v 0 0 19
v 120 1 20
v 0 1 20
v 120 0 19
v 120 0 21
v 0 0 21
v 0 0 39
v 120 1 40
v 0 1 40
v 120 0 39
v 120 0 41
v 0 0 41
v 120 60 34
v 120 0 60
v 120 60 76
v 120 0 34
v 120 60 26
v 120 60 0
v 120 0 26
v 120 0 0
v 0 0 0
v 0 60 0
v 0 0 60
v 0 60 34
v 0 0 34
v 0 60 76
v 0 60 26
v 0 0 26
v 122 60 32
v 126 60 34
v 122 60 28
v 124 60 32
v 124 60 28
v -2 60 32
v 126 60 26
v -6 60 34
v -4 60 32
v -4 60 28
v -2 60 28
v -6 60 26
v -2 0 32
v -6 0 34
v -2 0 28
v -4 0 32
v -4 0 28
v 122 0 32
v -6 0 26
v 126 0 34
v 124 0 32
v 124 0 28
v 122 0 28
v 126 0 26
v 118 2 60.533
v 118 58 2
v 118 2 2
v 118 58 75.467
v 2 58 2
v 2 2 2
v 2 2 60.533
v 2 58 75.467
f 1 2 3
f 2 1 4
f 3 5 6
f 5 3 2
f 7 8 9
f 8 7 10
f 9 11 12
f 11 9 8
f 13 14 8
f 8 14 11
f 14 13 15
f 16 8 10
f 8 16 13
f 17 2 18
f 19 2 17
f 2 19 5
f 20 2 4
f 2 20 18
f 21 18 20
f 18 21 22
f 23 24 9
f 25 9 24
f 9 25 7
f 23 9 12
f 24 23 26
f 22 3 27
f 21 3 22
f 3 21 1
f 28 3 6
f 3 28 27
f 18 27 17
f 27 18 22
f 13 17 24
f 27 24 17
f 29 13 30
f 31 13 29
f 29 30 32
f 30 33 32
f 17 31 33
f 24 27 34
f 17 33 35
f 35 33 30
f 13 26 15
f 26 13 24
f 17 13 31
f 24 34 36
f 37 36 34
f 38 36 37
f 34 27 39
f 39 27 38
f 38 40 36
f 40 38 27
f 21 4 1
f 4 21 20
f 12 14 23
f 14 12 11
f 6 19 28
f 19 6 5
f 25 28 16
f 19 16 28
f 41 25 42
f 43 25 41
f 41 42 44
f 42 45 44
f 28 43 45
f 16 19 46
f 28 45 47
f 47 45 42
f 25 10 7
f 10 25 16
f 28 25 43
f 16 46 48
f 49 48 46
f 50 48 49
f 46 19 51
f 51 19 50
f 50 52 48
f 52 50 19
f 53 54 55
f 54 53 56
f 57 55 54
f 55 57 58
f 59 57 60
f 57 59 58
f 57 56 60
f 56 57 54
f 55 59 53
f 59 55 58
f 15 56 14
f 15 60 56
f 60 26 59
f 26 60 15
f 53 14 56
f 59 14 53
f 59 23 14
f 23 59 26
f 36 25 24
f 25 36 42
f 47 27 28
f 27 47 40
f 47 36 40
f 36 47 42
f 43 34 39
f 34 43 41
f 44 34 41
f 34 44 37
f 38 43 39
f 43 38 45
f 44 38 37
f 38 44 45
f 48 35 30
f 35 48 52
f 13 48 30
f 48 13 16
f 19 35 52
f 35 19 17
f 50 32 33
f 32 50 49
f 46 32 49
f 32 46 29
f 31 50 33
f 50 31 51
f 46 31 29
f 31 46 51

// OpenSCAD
// file: ../../lib/logic.scad
use <./strings.scad>

function int(s, total=0, i=0) = (i == len(s))
  ? total
  : int(s, total*10 + ord(s[i]) - ord("0"), i+1);

function frac(s) = int(s) / pow(10, len(s));

function num(s) =
  let (parts = split(s, "."))
  len(parts) == 1
  ? int(parts[0])
  : int(parts[0]) + frac(parts[1]);

function any(list, i=0) = (i == len(list))
  ? false
  : list[i] || any(list, i+1);

function all(list, i=0) = (i == len(list))
  ? true
  : list[i] && all(list, i+1);

function is_int_string(s) = all([for(c=s) "0" <= c && c <= "9"]);

function is_num_string(s) =
  let (parts = split(s, "."))
  len(parts) == 1
  ? is_int_string(parts[0])
  : len(parts) == 2
    ? is_int_string(parts[0]) && is_int_string(parts[1])
    : false;

function _test_logic() =
  assert (int("123") == 123)
  assert (int("9999") == 9999)
  assert (frac("5") == 0.5)
  assert (frac("33333") == 0.33333)
  assert (frac("111111") == 0.111111)
  assert (frac("02") == 0.02)
  assert (frac("020000") == 0.02)
  assert (frac("0") == 0)
  assert (frac("0000000000000") == 0)
  assert (frac("0000000000001") == 0.0000000000001)
  assert (num("123") == 123)
  assert (num("2.75") == 2.75)
  assert (num("1234.991230149") == 1234.991230149) // I'm kinda shocked that works
  assert (any([false, "", 0, []]) == false)
  assert (any([false, "", 0, [], 1]) == true)
  assert (any([]) == false)
  assert (all([1, true, "a"]) == true)
  assert (all([1, true, "a", ""]) == false)
  assert (all([]) == true)
  assert (is_int_string("1234") == true)
  assert (is_int_string("093999914") == true)
  assert (is_int_string("123A") == false)
  assert (is_int_string("two") == false)
  assert (is_int_string("2.6") == false)
  assert (is_num_string("2.6") == true)
  assert (is_num_string("1241422.5522106") == true)
  assert (is_num_string("124142205522106") == true)
  assert (is_num_string("1241422,5522106") == false)
  assert (is_num_string("1241422.552.106") == false)
  assert (is_num_string("1241422Q") == false)
  "test logic success";

echo(_test_logic());
// file: ../../lib/strings.scad
function contains(list, item, i=0) = (i == len(list))
  ? false
  : list[i] == item || contains(list, item, i+1);

function strcat(char_array, i=0, r="") = (i == len(char_array))
  ? r
  : strcat(char_array, i+1, str(r, char_array[i]));

function substr(s, start=0, limit=undef) =
  // return str[i] where start <= i < limit
  let (end = limit == undef ? len(s)-1 : min(limit-1, len(s)-1))
  end < start
  ? ""
  : strcat([for (i=[start:end]) s[i]]);

function contains_substr(s, sub) =
  // return true if substr is found anywhere in s
  let (list = [for (i=[0:1:len(s)-len(sub)]) substr(s, start=i, limit=i+len(sub))])
  contains(list, sub);

function replace_substr(s, repl, start=0, limit=undef) =
  // remove a substring and replace it with another string
  let (end = limit == undef ? len(s)-1 : limit-1)
  str(substr(s, limit=start), repl, substr(s, start=end+1));

function split(s, separator=" ", parts=[]) =
  let (match=search(separator, s, 0)[0])
  match == []
  ? concat(parts, [s])
  : split(substr(s, start=match[0]+1), separator, concat(parts, [substr(s, limit=match[0])]));

function first(string, char, after=-1) =
  let (result = search(char, substr(string, start=after+1), 1))
  result == []
  ? undef
  : result[0] + after+1;

function last(string, char) =
  let (result=search(char, string, 0))
  result == []
  ? undef
  : result[0][len(result[0])-1];

function _test_strings() =
  assert (contains("abcd", "d") == true)
  assert (contains("abcd", "Q") == false)
  assert (contains([1, 2, 3, 4], 1) == true)
  assert (contains([1, 2, 3, 4], 5) == false)
  assert (contains([["a"], 2, [], ""], []) == true)
  assert (contains([["a"], 2, [], ""], ["a"]) == true)
  assert (contains([["a"], 2, [], ""], ["b"]) == false)
  assert (strcat([]) == "")
  assert (strcat(["a"]) == "a")
  assert (strcat(["a", "b"]) == "ab")
  assert (strcat(["a", "", "b"]) == "ab")
  assert (substr("abcde") == "abcde")
  assert (substr("abcde", start=0) == "abcde")
  assert (substr("abcde", start=1) == "bcde")
  assert (substr("abcde", limit=3) == "abc")
  assert (substr("abcde", start=2, limit=4) == "cd")
  assert (substr("abcde", start=99) == "")
  assert (contains_substr("abcde", "a") == true)
  assert (contains_substr("abcde", "ab") == true)
  assert (contains_substr("abcde", "abcde") == true)
  assert (contains_substr("abcde", "de") == true)
  assert (contains_substr("abcde", "Q") == false)
  assert (contains_substr("abcde", "abcdefghijklmnop") == false)
  assert (contains_substr("abcde", "e*") == false)
  assert (contains_substr("abcde", "") == true)
  assert (replace_substr("abcde", "CD", start=2, limit=4) == "abCDe")
  assert (replace_substr("abcde", "CD", start=2, limit=5) == "abCD")
  assert (replace_substr("abcde", "CD", start=2, limit=999) == "abCD")
  assert (replace_substr("abcde", "CD", start=2) == "abCD")
  assert (replace_substr("abcde", "AAA", start=0) == "AAA")
  assert (replace_substr("abcde", "AAA") == "AAA")
  assert (replace_substr("abcde", "III", limit=0) == "IIIabcde")
  assert (replace_substr("abcde", "III", start=3, limit=3) == "abcIIIde")
  assert (replace_substr("abcde", "III", start=5) == "abcdeIII")
  assert (replace_substr("abcde", "III", start=999) == "abcdeIII")
  assert (split("abc,defg,hi", ",") == ["abc", "defg", "hi"])
  assert (split("abc,defg,hi", "#") == ["abc,defg,hi"])
  assert (split(",,ab,c,,d,efg", ",") == ["", "", "ab", "c", "", "d", "efg"])
  assert (split("a b  cd ") == ["a", "b", "", "cd", ""])
  assert (split("abcd") == ["abcd"])
  assert (first("aaaaa", "a") == 0)
  assert (first("00aaa", "a") == 2)
  assert (first("0000a", "a") == 4)
  assert (first("0000a", "Z") == undef)
  assert (first("aaaaa", "a", after=2) == 3)
  assert (first("aaa00", "a", after=2) == undef)
  assert (first("a000a", "a", after=0) == 4)
  assert (first("a000a", "a", after=99) == undef)
  assert (last("aaaaa", "a") == 4)
  assert (last("aaa00", "a") == 2)
  assert (last("a0000", "a") == 0)
  assert (last("a0000", "Z") == undef)
  "test strings success";

echo(_test_strings());
// file: ../../lib/props.scad
use <./logic.scad>
use <./strings.scad>

// Global prop function.
// The idea here is to define a function like:
//   function prop(key) = getprop(key, global_props);
// and then use that to share variables throughout your multi-file design.
// A bunch of expressions are available within the props dictionary, like
// references to other props, and various computations. Whitespace
// is strict in the expressions.
props_example = [
  ["key1", 1],
  ["key2", 2],
  ["key3", 3],
  ["key4", "$key3 * 20"],
  ["namespace.value1", 8],
  ["namespace.value2", "$key2"],
  ["othernamespace.value1", "$namespace.value2"],
  ["s", "hello"],
  ["e1", "$key3 / 2"],
  ["e2", "$namespace.value2 + 1.275"],
  ["e3", "$othernamespace.value1 * 6"],
  ["e4", "$key2 ^ 6"],
  ["e5", "$key3 % 2"],
  ["e6", "cos $key4"],
  ["p1", "$key3 * ($key2 + $key1)"],
  ["p2", "(1 + 2) * (2 ^ 3)"],
  ["p3", "((1 + $e5) + 1) + (cos $key4)"],
  ["zero", 0],
  ["false", false],
  ["undef", undef],
  ["empty-array", []],
];

function eval_literal(args) =
  // compute things like `2 + 4` or `cos 45`
  len(args) == 0 ? undef :
  args[0] == "norm" ? norm([for(i=[1:len(args)-1]) args[i]]) :
  len(args) == 3
  ? args[1] == "/" ? args[0] / args[2]
    : args[1] == "*" ? args[0] * args[2]
    : args[1] == "+" ? args[0] + args[2]
    : args[1] == "-" ? args[0] - args[2]
    : args[1] == "^" ? args[0] ^ args[2]
    : args[1] == "%" ? args[0] % args[2]
    : undef
  : len(args) == 2
    ? args[0] == "sin" ? sin(args[1])
      : args[0] == "cos" ? cos(args[1])
      : args[0] == "tan" ? tan(args[1])
      : args[0] == "asin" ? asin(args[1])
      : args[0] == "acos" ? acos(args[1])
      : args[0] == "atan" ? atan(args[1])
      : args[0] == "sqrt" ? sqrt(args[1])
      : undef
    : len(args) == 1
      ? args[0]
      : undef;

function eval_raw(expression, props) =
  // resolve types and props in expressions, like "(cos $thing) * ($other / 3)"
  // note that whitespace is not ignored
  !is_string(expression)
  ? expression
  : !contains(expression, "(")
    ? // simple expression like "$thing + 5"
      eval_literal([
        for (arg=split(expression))
          arg[0] == "$"
          ? getprop(substr(arg, start=1), props)
          : is_num_string(arg)
            ? num(arg)
            : arg
      ])
    : // resolve the innermost parens and start again
      let (inner_start = last(expression, "("),
           inner_end = first(expression, ")", after=inner_start),
           inner = eval_raw(substr(expression, inner_start+1, inner_end), props))
      eval_raw(replace_substr(expression, inner, inner_start, inner_end+1), props);

function getprop(key, props) =
  let (prop = props[search([key], props)[0]][1])
  assert (prop != undef, str("Missing key in properties: ", key))
  let (result = eval_raw(prop, props))
  assert (result != undef, str("Invalid expression in properties: ", prop))
  result;

function _test_props() =
  assert (getprop("key3", props_example) == 3)
  assert (getprop("namespace.value2", props_example) == 2)
  assert (getprop("e1", props_example) == 1.5)
  assert (getprop("e2", props_example) == 3.275)
  assert (getprop("e3", props_example) == 12)
  assert (getprop("e4", props_example) == 64)
  assert (getprop("e5", props_example) == 1)
  assert (getprop("e6", props_example) == 0.5)
  assert (getprop("p1", props_example) == 9)
  assert (getprop("p2", props_example) == 24)
  assert (getprop("p3", props_example) == 3.5)
  assert (getprop("s", props_example) == "hello")
  assert (getprop("zero", props_example) == 0)
  assert (getprop("false", props_example) == false)
  assert (getprop("empty-array", props_example) == [])
  "test props success";

echo(_test_props());
// file: ../../lib/shapes.scad
use <./strings.scad>

$fa = $preview ? 1 : .1;
$fs = $preview ? 1 : .1;

// Beginnings of a 3d shapes library. I want shapes with a "margin" property
// and possibly specific overrides for margins in a particular direction.
// The idea is to add a thickness around the outside of the entire shape
// without changing the center of the shape. This can be used with
// `difference` to carve out space for shapes to fit, with adjustable
// tolerance.

// given on="x+,y+" or whatever, figure out the translation vector
function _t(on, x=0, y=0, z=0) = 
  let(t = split(on, ","))
  (contains(t, "x+") ? [ x, 0, 0] : [0, 0, 0]) +
  (contains(t, "x-") ? [-x, 0, 0] : [0, 0, 0]) +
  (contains(t, "y+") ? [0,  y, 0] : [0, 0, 0]) +
  (contains(t, "y-") ? [0, -y, 0] : [0, 0, 0]) +
  (contains(t, "z+") ? [0, 0,  z] : [0, 0, 0]) +
  (contains(t, "z-") ? [0, 0, -z] : [0, 0, 0]);

module prism(
  n=undef,
  r=undef, side=undef, // must specify one of r or side length
  z=undef, // thickness (in z direction)
  on="origin", // placement: origin | x+ | z+,y- | etc
  margin=0,       // global margin
  margin_r=undef, margin_side=undef, // override r margin
  margin_z=undef, // override z margin
  chamfer=0,
) {
  a = 180/n;
  margin_side = margin_side == undef ? margin : margin_side;
  margin_r = margin_r == undef ? margin_side/cos(a) : margin_r;
  margin_z = margin_z == undef ? margin : margin_z;
  r = r == undef ? side/(2*sin(a)) : r;
  translate(_t(on, y=r*cos(a), z=z/2))
    rotate([0, 0, 90 - (n%2 == 0 ? a : 0)])
      if (chamfer > 0) {
        // chamfer should be measured in distance perpendicular to the side, which is at
        // angle `a` from `r` (i.e. the same angle we have to rotate if n is odd.
        cz = chamfer;
        cr = chamfer/cos(a);
        // TODO chamfer should depend on the margin, but it's pretty tedious
        // for a small gain
        translate([0, 0, (z + 2*margin_z - cz)/2])
          cylinder(h=cz, r1=r + margin_r, r2=r + margin_r - cr, $fn=n, center=true);
        cylinder(h=z + 2*margin_z - 2*cz, r=r + margin_r, $fn=n, center=true);
        translate([0, 0, -(z + 2*margin_z - cz)/2])
          cylinder(h=cz, r2=r + margin_r, r1=r + margin_r - cr, $fn=n, center=true);
      } else {
        cylinder(h=z + 2*margin_z, r=r + margin_r, $fn=n, center=true);
      }
}



//difference() {
//  %prism(n=5, r=8, z=4, chamfer=1, on="y+,z-", margin=1);
//  prism(n=5, r=8, z=4, chamfer=1, on="y+,z-");
//}

module box(
  x=undef, y=undef, z=undef,  // 3 ways to specify size
  on="origin", // placement: origin | x+ | z+,y- | etc
  margin=0, // global margin
  margin_x=undef,  // override margins
  margin_y=undef,
  margin_z=undef,
  chamfer=0, // flatten the corners
) {
  s = is_num(z)  ? [x, y, z]  // size: x=num, y=num, z=num
    : is_list(x) ? x          //   or: x=[num, num, num]
    : [x, x, x];              //   or: x=num
  m = [
    margin_x == undef ? margin : margin_x,
    margin_y == undef ? margin : margin_y,
    margin_z == undef ? margin : margin_z
  ];

  translate(_t(on, x=s.x/2, y=s.y/2, z=s.z/2))
    if (chamfer > 0) {
      // This looks pretty wild, but I just want to maintain a minimum margin
      // in each of the specified directions from the chamfer, so to keep the
      // chamfer angles all at 45, you need take the smallest chamfer out of
      // the big shape (box + margins) that maintains the right margin
      // distance in each direction.
      cyz = 2*(min(m.y, m.z) + chamfer);
      cxz = 2*(min(m.x, m.z) + chamfer);
      cxy = 2*(min(m.x, m.y) + chamfer);
      intersection() {
        cube(s + 2*m, center=true);
        rotate([45,0,0])
          cube([
            s.x + 2*m.x + 1,
            (s.y + 2*m.y + s.z + 2*m.z - cyz)/sqrt(2),
            (s.y + 2*m.y + s.z + 2*m.z - cyz)/sqrt(2)
          ], center=true);
        rotate([0,45,0])
          cube([
            (s.x + 2*m.x + s.z + 2*m.z - cxz)/sqrt(2),
            s.y + 2*m.y + 1,
            (s.x + 2*m.x + s.z + 2*m.z - cxz)/sqrt(2)
          ], center=true);
        rotate([0,0,45])
          cube([
            (s.x + 2*m.x + s.y + 2*m.y - cxy)/sqrt(2),
            (s.x + 2*m.x + s.y + 2*m.y - cxy)/sqrt(2),
            s.z + 2*m.z + 1
          ], center=true);
      }
    } else {
      cube(s + 2*m, center=true);
    }
}

//difference() {
//  box(10, 20, 30, chamfer=4, margin=1, margin_x=2);
//  box(10, 20, 30, chamfer=4);
//  // see through to the chamfer on different margins
//  color("red") box(100, on="z+");
//}

//box(1, chamfer=.1, on="z+,x-");
//%box(x=10, y=10, z=.1, on="z+,x-");
// file: props.scad
use <../../lib/props.scad>

global_props = [
  // basic exterior dimensions
  ["bin.depth", 60],
  ["bin.width", 120],
  ["bin.front.height", 60],
  ["bin.back.height", 76],
  ["panel.thickness", 2],

  // lid/hinge
  ["lid.angle", "atan (($bin.back.height - $bin.front.height) / $bin.depth)"],
  ["lid.length", "norm $bin.depth ($bin.back.height - $bin.front.height)"],
  ["lid.cutout.radius", "$hinge.radius + $panel.thickness"],
  ["hinge.radius", 4],
  ["hinge.length", "$bin.width"],

  // hinge fin position
  ["hinge.fin.start", "$panel.thickness + 0.2"],
  ["hinge.fin.end", "$hinge.length - $hinge.fin.start"],
  ["hinge.fin.count", 5],

  // hinge fin shape
  ["hinge.fin.length", "$lid.length - $panel.thickness"],
  ["hinge.fin.width", 2.31],
  ["hinge.fin.height", "$hinge.radius * 2"],
  ["hinge.fin.taper.angle", 40],
  ["hinge.fin.margin", 0.2],

  // hinge pin
  ["hinge.pin.radius", 2],
  ["hinge.pin.margin", 0.2],
  ["hinge.pin.start", "$panel.thickness / 2"],
  ["hinge.pin.end", "$hinge.length - $hinge.pin.start"],
];

function prop(key) = getprop(key, global_props);
// file: arms.scad
use <../../lib/shapes.scad>
use <props.scad>

module arms(
  w=prop("bin.width"),
  fh=prop("bin.front.height"),
  d=prop("bin.depth"),
  t=prop("panel.thickness"),
) {
  translate([0, 0, fh/2]) {
    difference() {
      box(x=3*t, y=d, z=4*t, on="x-,y+");
      box(x=3*t, y=d, z=4*t, on="x-,y+", margin=-t, margin_y=1);
    }
    translate([w, 0, 0])
      difference() {
        box(x=3*t, y=d, z=4*t, on="x+,y+");
        box(x=3*t, y=d, z=4*t, on="x+,y+", margin=-t, margin_y=1);
      }
  }
};

arms();
// file: bin.scad
use <../../lib/shapes.scad>
use <props.scad>
$fa = $preview ? 1 : .1;
$fs = $preview ? 1 : .1;

module bin(
  width=prop("bin.width"),
  depth=prop("bin.depth"),
  front_height=prop("bin.front.height"),
  back_height=prop("bin.back.height"),
  panel_thickness=prop("panel.thickness"),
  lid_angle=prop("lid.angle"),
) {
  difference() {
    // bin-sized block
    box(x=width, y=depth, z=back_height, on="x+,y+,z+");

    // carve out interior
    box(x=width, y=depth, z=999, on="x+,y+,z+", margin=-panel_thickness);

    // slice off the top
    translate([0, 0, front_height])
      rotate([lid_angle, 0, 0])
        box(999, on="z+");

    // carve out the horizontal grooves on the front
    for (h=[1/3, 2/3]) {
      translate([0, panel_thickness/2, front_height*h])
        rotate([45, 0, 0])
          box(999, on="y-,z+");
    }
  }
}

bin();
// file: lid.scad
use <props.scad>
use <../../lib/util.scad>

$fn = $preview ? 30 : 128;

// mode idea:
// use mode "normal" for the shape if it's free of any obstructions
// use mode "margin" to subtract space around the shape so that it can move
// use mode "cutout" to subtract interior space for a shape so that it can be inserted into a solid

module _fin(
  l=prop("hinge.fin.length"),
  w=prop("hinge.fin.width"),
  h=prop("hinge.fin.height"),
  a=prop("hinge.fin.taper.angle"),
  m=prop("hinge.fin.margin"),
  mode="normal", // "normal" or "margin"
  bump=undef, // "left", "right", or undef
) {
  // fin arm (no margins necessary)
  translate([0, 0, -w/2])
    linear_extrude(w)
      translate([0, -h/2, 0])
        polygon([[0,0], [0, h], [l, h], [l - (h / tan(a)), 0]]);

  // circular part (with optional margin)
  translate([0, 0, -w/2 - (mode == "margin" ? m : 0)])
    linear_extrude(w + (mode == "margin" ? 2*m : 0))
      circle(d=h + (mode == "margin" ? 2*m : 0));

  // latch bump
  if (bump)
    translate([l - h/tan(a) - w, 0, 0])
      intersection() {
        sphere(r=w + (mode == "margin" ? m : 0));
        translate([-w, -w, bump == "left" ? 0 : -2*w])
          cube(2*w);
      }
}

module _fins(
  // mode: normal or margin
  start=prop("hinge.fin.start"),
  end=prop("hinge.fin.end"),
  count=prop("hinge.fin.count"),
  w=prop("hinge.fin.width"),
  margin=prop("hinge.fin.margin"),
  mode="normal",
) {
  start = start + w/2;
  end = end - w/2;

  // first fin
  translate([0, 0, start])
    _fin(mode=mode, bump="right");

  // interior fins
  for (i=[1:count - 2])
    translate([0, 0, start + i * (end - start) / (count - 1)])
      _fin(mode=mode);

  // last fin
  translate([0, 0, end])
    _fin(mode=mode, bump="left");
}

module _pin(
  // mode: normal or margin
  start=prop("hinge.pin.start"),
  end=prop("hinge.pin.end"),
  r=prop("hinge.pin.radius"),
  margin=prop("hinge.pin.margin"),
  mode="normal",
) {
  margin = mode == "normal" ? 0 : margin;
  r = r + margin;
  h = end - start + 2*margin;
  translate([0, 0, start-margin])
    cylinder(r=r, h=h);
}

module _cuff(
  // mode: normal or margin
  start=0,
  end=prop("hinge.length"),
  r=prop("hinge.radius"),
) {
  difference() {
    translate([0, 0, start])
      cylinder(r=r, h=end-start);
    _pin(mode="margin");
    _fins(mode="margin");
  }
}


module _top() {
  // lid length has to be slightly increased because of where the radius
  // from the hinge hits at 90 degrees
  let (
    l=prop("lid.length"),
    t=prop("panel.thickness"),
    r=prop("hinge.radius"),
    a=prop("lid.angle"),
    w=prop("box.width")
  )
  translate([0,0,r-.001]) // fixes a warning with the hinge overlap
    cube([w, l + (t - r*sin(a))/cos(a), t]);
}

module _assembly(
  // mode: normal or cutout
  // note that right now cutout is mostly about the hinge, not the fins
  cutout_radius=prop("lid.cutout.radius"),
  cutout_width=prop("hinge.length"),
  wall_thickness=prop("panel.thickness"),
  mode="normal"
) {
  _top();
  rotate([90,0,90]) {
    _fins(mode=mode == "normal" ? "normal" : "margin");
    _pin(mode=mode == "normal" ? "normal" : "margin");
    _cuff();
  }
  if (mode != "normal")
    rotate([90,0,0]) {
      r_extrude(x=120)
        square([cutout_width, cutout_radius]);
      // clear the gap between the top and the hinge cuff
      r_extrude(x=-45)
        translate([wall_thickness, 0, 0])
          square([cutout_width - 2*wall_thickness, cutout_radius]);
    }
}

module lid(angle=0, mode="normal") {
  // mode: normal or cutout

  // position should be such that the hinge pin in centered on the outside
  // edge of the back wall, and so the lid is exactly touching, when the
  // hinge is rotated "lid.angle" down from horizontal. I think I did
  // the math right...after the 4th time!
  let (t=prop("panel.thickness"), a=prop("lid.angle"), r=prop("hinge.radius"), h=prop("box.back.height"))
  translate([
    0, // already starting at x=0
    -t, // move to the outside of the back wall
    h + t*tan(a) - r/cos(a) // extension of the lid along angle a
  ])
    rotate([angle-a, 0, 0])
      _assembly(mode=mode);
}
// main file
use <lid.scad>
use <bin.scad>
use <arms.scad>
$fa = $preview ? 1 : .1;
$fs = $preview ? 1 : .1;

bin();
arms();
